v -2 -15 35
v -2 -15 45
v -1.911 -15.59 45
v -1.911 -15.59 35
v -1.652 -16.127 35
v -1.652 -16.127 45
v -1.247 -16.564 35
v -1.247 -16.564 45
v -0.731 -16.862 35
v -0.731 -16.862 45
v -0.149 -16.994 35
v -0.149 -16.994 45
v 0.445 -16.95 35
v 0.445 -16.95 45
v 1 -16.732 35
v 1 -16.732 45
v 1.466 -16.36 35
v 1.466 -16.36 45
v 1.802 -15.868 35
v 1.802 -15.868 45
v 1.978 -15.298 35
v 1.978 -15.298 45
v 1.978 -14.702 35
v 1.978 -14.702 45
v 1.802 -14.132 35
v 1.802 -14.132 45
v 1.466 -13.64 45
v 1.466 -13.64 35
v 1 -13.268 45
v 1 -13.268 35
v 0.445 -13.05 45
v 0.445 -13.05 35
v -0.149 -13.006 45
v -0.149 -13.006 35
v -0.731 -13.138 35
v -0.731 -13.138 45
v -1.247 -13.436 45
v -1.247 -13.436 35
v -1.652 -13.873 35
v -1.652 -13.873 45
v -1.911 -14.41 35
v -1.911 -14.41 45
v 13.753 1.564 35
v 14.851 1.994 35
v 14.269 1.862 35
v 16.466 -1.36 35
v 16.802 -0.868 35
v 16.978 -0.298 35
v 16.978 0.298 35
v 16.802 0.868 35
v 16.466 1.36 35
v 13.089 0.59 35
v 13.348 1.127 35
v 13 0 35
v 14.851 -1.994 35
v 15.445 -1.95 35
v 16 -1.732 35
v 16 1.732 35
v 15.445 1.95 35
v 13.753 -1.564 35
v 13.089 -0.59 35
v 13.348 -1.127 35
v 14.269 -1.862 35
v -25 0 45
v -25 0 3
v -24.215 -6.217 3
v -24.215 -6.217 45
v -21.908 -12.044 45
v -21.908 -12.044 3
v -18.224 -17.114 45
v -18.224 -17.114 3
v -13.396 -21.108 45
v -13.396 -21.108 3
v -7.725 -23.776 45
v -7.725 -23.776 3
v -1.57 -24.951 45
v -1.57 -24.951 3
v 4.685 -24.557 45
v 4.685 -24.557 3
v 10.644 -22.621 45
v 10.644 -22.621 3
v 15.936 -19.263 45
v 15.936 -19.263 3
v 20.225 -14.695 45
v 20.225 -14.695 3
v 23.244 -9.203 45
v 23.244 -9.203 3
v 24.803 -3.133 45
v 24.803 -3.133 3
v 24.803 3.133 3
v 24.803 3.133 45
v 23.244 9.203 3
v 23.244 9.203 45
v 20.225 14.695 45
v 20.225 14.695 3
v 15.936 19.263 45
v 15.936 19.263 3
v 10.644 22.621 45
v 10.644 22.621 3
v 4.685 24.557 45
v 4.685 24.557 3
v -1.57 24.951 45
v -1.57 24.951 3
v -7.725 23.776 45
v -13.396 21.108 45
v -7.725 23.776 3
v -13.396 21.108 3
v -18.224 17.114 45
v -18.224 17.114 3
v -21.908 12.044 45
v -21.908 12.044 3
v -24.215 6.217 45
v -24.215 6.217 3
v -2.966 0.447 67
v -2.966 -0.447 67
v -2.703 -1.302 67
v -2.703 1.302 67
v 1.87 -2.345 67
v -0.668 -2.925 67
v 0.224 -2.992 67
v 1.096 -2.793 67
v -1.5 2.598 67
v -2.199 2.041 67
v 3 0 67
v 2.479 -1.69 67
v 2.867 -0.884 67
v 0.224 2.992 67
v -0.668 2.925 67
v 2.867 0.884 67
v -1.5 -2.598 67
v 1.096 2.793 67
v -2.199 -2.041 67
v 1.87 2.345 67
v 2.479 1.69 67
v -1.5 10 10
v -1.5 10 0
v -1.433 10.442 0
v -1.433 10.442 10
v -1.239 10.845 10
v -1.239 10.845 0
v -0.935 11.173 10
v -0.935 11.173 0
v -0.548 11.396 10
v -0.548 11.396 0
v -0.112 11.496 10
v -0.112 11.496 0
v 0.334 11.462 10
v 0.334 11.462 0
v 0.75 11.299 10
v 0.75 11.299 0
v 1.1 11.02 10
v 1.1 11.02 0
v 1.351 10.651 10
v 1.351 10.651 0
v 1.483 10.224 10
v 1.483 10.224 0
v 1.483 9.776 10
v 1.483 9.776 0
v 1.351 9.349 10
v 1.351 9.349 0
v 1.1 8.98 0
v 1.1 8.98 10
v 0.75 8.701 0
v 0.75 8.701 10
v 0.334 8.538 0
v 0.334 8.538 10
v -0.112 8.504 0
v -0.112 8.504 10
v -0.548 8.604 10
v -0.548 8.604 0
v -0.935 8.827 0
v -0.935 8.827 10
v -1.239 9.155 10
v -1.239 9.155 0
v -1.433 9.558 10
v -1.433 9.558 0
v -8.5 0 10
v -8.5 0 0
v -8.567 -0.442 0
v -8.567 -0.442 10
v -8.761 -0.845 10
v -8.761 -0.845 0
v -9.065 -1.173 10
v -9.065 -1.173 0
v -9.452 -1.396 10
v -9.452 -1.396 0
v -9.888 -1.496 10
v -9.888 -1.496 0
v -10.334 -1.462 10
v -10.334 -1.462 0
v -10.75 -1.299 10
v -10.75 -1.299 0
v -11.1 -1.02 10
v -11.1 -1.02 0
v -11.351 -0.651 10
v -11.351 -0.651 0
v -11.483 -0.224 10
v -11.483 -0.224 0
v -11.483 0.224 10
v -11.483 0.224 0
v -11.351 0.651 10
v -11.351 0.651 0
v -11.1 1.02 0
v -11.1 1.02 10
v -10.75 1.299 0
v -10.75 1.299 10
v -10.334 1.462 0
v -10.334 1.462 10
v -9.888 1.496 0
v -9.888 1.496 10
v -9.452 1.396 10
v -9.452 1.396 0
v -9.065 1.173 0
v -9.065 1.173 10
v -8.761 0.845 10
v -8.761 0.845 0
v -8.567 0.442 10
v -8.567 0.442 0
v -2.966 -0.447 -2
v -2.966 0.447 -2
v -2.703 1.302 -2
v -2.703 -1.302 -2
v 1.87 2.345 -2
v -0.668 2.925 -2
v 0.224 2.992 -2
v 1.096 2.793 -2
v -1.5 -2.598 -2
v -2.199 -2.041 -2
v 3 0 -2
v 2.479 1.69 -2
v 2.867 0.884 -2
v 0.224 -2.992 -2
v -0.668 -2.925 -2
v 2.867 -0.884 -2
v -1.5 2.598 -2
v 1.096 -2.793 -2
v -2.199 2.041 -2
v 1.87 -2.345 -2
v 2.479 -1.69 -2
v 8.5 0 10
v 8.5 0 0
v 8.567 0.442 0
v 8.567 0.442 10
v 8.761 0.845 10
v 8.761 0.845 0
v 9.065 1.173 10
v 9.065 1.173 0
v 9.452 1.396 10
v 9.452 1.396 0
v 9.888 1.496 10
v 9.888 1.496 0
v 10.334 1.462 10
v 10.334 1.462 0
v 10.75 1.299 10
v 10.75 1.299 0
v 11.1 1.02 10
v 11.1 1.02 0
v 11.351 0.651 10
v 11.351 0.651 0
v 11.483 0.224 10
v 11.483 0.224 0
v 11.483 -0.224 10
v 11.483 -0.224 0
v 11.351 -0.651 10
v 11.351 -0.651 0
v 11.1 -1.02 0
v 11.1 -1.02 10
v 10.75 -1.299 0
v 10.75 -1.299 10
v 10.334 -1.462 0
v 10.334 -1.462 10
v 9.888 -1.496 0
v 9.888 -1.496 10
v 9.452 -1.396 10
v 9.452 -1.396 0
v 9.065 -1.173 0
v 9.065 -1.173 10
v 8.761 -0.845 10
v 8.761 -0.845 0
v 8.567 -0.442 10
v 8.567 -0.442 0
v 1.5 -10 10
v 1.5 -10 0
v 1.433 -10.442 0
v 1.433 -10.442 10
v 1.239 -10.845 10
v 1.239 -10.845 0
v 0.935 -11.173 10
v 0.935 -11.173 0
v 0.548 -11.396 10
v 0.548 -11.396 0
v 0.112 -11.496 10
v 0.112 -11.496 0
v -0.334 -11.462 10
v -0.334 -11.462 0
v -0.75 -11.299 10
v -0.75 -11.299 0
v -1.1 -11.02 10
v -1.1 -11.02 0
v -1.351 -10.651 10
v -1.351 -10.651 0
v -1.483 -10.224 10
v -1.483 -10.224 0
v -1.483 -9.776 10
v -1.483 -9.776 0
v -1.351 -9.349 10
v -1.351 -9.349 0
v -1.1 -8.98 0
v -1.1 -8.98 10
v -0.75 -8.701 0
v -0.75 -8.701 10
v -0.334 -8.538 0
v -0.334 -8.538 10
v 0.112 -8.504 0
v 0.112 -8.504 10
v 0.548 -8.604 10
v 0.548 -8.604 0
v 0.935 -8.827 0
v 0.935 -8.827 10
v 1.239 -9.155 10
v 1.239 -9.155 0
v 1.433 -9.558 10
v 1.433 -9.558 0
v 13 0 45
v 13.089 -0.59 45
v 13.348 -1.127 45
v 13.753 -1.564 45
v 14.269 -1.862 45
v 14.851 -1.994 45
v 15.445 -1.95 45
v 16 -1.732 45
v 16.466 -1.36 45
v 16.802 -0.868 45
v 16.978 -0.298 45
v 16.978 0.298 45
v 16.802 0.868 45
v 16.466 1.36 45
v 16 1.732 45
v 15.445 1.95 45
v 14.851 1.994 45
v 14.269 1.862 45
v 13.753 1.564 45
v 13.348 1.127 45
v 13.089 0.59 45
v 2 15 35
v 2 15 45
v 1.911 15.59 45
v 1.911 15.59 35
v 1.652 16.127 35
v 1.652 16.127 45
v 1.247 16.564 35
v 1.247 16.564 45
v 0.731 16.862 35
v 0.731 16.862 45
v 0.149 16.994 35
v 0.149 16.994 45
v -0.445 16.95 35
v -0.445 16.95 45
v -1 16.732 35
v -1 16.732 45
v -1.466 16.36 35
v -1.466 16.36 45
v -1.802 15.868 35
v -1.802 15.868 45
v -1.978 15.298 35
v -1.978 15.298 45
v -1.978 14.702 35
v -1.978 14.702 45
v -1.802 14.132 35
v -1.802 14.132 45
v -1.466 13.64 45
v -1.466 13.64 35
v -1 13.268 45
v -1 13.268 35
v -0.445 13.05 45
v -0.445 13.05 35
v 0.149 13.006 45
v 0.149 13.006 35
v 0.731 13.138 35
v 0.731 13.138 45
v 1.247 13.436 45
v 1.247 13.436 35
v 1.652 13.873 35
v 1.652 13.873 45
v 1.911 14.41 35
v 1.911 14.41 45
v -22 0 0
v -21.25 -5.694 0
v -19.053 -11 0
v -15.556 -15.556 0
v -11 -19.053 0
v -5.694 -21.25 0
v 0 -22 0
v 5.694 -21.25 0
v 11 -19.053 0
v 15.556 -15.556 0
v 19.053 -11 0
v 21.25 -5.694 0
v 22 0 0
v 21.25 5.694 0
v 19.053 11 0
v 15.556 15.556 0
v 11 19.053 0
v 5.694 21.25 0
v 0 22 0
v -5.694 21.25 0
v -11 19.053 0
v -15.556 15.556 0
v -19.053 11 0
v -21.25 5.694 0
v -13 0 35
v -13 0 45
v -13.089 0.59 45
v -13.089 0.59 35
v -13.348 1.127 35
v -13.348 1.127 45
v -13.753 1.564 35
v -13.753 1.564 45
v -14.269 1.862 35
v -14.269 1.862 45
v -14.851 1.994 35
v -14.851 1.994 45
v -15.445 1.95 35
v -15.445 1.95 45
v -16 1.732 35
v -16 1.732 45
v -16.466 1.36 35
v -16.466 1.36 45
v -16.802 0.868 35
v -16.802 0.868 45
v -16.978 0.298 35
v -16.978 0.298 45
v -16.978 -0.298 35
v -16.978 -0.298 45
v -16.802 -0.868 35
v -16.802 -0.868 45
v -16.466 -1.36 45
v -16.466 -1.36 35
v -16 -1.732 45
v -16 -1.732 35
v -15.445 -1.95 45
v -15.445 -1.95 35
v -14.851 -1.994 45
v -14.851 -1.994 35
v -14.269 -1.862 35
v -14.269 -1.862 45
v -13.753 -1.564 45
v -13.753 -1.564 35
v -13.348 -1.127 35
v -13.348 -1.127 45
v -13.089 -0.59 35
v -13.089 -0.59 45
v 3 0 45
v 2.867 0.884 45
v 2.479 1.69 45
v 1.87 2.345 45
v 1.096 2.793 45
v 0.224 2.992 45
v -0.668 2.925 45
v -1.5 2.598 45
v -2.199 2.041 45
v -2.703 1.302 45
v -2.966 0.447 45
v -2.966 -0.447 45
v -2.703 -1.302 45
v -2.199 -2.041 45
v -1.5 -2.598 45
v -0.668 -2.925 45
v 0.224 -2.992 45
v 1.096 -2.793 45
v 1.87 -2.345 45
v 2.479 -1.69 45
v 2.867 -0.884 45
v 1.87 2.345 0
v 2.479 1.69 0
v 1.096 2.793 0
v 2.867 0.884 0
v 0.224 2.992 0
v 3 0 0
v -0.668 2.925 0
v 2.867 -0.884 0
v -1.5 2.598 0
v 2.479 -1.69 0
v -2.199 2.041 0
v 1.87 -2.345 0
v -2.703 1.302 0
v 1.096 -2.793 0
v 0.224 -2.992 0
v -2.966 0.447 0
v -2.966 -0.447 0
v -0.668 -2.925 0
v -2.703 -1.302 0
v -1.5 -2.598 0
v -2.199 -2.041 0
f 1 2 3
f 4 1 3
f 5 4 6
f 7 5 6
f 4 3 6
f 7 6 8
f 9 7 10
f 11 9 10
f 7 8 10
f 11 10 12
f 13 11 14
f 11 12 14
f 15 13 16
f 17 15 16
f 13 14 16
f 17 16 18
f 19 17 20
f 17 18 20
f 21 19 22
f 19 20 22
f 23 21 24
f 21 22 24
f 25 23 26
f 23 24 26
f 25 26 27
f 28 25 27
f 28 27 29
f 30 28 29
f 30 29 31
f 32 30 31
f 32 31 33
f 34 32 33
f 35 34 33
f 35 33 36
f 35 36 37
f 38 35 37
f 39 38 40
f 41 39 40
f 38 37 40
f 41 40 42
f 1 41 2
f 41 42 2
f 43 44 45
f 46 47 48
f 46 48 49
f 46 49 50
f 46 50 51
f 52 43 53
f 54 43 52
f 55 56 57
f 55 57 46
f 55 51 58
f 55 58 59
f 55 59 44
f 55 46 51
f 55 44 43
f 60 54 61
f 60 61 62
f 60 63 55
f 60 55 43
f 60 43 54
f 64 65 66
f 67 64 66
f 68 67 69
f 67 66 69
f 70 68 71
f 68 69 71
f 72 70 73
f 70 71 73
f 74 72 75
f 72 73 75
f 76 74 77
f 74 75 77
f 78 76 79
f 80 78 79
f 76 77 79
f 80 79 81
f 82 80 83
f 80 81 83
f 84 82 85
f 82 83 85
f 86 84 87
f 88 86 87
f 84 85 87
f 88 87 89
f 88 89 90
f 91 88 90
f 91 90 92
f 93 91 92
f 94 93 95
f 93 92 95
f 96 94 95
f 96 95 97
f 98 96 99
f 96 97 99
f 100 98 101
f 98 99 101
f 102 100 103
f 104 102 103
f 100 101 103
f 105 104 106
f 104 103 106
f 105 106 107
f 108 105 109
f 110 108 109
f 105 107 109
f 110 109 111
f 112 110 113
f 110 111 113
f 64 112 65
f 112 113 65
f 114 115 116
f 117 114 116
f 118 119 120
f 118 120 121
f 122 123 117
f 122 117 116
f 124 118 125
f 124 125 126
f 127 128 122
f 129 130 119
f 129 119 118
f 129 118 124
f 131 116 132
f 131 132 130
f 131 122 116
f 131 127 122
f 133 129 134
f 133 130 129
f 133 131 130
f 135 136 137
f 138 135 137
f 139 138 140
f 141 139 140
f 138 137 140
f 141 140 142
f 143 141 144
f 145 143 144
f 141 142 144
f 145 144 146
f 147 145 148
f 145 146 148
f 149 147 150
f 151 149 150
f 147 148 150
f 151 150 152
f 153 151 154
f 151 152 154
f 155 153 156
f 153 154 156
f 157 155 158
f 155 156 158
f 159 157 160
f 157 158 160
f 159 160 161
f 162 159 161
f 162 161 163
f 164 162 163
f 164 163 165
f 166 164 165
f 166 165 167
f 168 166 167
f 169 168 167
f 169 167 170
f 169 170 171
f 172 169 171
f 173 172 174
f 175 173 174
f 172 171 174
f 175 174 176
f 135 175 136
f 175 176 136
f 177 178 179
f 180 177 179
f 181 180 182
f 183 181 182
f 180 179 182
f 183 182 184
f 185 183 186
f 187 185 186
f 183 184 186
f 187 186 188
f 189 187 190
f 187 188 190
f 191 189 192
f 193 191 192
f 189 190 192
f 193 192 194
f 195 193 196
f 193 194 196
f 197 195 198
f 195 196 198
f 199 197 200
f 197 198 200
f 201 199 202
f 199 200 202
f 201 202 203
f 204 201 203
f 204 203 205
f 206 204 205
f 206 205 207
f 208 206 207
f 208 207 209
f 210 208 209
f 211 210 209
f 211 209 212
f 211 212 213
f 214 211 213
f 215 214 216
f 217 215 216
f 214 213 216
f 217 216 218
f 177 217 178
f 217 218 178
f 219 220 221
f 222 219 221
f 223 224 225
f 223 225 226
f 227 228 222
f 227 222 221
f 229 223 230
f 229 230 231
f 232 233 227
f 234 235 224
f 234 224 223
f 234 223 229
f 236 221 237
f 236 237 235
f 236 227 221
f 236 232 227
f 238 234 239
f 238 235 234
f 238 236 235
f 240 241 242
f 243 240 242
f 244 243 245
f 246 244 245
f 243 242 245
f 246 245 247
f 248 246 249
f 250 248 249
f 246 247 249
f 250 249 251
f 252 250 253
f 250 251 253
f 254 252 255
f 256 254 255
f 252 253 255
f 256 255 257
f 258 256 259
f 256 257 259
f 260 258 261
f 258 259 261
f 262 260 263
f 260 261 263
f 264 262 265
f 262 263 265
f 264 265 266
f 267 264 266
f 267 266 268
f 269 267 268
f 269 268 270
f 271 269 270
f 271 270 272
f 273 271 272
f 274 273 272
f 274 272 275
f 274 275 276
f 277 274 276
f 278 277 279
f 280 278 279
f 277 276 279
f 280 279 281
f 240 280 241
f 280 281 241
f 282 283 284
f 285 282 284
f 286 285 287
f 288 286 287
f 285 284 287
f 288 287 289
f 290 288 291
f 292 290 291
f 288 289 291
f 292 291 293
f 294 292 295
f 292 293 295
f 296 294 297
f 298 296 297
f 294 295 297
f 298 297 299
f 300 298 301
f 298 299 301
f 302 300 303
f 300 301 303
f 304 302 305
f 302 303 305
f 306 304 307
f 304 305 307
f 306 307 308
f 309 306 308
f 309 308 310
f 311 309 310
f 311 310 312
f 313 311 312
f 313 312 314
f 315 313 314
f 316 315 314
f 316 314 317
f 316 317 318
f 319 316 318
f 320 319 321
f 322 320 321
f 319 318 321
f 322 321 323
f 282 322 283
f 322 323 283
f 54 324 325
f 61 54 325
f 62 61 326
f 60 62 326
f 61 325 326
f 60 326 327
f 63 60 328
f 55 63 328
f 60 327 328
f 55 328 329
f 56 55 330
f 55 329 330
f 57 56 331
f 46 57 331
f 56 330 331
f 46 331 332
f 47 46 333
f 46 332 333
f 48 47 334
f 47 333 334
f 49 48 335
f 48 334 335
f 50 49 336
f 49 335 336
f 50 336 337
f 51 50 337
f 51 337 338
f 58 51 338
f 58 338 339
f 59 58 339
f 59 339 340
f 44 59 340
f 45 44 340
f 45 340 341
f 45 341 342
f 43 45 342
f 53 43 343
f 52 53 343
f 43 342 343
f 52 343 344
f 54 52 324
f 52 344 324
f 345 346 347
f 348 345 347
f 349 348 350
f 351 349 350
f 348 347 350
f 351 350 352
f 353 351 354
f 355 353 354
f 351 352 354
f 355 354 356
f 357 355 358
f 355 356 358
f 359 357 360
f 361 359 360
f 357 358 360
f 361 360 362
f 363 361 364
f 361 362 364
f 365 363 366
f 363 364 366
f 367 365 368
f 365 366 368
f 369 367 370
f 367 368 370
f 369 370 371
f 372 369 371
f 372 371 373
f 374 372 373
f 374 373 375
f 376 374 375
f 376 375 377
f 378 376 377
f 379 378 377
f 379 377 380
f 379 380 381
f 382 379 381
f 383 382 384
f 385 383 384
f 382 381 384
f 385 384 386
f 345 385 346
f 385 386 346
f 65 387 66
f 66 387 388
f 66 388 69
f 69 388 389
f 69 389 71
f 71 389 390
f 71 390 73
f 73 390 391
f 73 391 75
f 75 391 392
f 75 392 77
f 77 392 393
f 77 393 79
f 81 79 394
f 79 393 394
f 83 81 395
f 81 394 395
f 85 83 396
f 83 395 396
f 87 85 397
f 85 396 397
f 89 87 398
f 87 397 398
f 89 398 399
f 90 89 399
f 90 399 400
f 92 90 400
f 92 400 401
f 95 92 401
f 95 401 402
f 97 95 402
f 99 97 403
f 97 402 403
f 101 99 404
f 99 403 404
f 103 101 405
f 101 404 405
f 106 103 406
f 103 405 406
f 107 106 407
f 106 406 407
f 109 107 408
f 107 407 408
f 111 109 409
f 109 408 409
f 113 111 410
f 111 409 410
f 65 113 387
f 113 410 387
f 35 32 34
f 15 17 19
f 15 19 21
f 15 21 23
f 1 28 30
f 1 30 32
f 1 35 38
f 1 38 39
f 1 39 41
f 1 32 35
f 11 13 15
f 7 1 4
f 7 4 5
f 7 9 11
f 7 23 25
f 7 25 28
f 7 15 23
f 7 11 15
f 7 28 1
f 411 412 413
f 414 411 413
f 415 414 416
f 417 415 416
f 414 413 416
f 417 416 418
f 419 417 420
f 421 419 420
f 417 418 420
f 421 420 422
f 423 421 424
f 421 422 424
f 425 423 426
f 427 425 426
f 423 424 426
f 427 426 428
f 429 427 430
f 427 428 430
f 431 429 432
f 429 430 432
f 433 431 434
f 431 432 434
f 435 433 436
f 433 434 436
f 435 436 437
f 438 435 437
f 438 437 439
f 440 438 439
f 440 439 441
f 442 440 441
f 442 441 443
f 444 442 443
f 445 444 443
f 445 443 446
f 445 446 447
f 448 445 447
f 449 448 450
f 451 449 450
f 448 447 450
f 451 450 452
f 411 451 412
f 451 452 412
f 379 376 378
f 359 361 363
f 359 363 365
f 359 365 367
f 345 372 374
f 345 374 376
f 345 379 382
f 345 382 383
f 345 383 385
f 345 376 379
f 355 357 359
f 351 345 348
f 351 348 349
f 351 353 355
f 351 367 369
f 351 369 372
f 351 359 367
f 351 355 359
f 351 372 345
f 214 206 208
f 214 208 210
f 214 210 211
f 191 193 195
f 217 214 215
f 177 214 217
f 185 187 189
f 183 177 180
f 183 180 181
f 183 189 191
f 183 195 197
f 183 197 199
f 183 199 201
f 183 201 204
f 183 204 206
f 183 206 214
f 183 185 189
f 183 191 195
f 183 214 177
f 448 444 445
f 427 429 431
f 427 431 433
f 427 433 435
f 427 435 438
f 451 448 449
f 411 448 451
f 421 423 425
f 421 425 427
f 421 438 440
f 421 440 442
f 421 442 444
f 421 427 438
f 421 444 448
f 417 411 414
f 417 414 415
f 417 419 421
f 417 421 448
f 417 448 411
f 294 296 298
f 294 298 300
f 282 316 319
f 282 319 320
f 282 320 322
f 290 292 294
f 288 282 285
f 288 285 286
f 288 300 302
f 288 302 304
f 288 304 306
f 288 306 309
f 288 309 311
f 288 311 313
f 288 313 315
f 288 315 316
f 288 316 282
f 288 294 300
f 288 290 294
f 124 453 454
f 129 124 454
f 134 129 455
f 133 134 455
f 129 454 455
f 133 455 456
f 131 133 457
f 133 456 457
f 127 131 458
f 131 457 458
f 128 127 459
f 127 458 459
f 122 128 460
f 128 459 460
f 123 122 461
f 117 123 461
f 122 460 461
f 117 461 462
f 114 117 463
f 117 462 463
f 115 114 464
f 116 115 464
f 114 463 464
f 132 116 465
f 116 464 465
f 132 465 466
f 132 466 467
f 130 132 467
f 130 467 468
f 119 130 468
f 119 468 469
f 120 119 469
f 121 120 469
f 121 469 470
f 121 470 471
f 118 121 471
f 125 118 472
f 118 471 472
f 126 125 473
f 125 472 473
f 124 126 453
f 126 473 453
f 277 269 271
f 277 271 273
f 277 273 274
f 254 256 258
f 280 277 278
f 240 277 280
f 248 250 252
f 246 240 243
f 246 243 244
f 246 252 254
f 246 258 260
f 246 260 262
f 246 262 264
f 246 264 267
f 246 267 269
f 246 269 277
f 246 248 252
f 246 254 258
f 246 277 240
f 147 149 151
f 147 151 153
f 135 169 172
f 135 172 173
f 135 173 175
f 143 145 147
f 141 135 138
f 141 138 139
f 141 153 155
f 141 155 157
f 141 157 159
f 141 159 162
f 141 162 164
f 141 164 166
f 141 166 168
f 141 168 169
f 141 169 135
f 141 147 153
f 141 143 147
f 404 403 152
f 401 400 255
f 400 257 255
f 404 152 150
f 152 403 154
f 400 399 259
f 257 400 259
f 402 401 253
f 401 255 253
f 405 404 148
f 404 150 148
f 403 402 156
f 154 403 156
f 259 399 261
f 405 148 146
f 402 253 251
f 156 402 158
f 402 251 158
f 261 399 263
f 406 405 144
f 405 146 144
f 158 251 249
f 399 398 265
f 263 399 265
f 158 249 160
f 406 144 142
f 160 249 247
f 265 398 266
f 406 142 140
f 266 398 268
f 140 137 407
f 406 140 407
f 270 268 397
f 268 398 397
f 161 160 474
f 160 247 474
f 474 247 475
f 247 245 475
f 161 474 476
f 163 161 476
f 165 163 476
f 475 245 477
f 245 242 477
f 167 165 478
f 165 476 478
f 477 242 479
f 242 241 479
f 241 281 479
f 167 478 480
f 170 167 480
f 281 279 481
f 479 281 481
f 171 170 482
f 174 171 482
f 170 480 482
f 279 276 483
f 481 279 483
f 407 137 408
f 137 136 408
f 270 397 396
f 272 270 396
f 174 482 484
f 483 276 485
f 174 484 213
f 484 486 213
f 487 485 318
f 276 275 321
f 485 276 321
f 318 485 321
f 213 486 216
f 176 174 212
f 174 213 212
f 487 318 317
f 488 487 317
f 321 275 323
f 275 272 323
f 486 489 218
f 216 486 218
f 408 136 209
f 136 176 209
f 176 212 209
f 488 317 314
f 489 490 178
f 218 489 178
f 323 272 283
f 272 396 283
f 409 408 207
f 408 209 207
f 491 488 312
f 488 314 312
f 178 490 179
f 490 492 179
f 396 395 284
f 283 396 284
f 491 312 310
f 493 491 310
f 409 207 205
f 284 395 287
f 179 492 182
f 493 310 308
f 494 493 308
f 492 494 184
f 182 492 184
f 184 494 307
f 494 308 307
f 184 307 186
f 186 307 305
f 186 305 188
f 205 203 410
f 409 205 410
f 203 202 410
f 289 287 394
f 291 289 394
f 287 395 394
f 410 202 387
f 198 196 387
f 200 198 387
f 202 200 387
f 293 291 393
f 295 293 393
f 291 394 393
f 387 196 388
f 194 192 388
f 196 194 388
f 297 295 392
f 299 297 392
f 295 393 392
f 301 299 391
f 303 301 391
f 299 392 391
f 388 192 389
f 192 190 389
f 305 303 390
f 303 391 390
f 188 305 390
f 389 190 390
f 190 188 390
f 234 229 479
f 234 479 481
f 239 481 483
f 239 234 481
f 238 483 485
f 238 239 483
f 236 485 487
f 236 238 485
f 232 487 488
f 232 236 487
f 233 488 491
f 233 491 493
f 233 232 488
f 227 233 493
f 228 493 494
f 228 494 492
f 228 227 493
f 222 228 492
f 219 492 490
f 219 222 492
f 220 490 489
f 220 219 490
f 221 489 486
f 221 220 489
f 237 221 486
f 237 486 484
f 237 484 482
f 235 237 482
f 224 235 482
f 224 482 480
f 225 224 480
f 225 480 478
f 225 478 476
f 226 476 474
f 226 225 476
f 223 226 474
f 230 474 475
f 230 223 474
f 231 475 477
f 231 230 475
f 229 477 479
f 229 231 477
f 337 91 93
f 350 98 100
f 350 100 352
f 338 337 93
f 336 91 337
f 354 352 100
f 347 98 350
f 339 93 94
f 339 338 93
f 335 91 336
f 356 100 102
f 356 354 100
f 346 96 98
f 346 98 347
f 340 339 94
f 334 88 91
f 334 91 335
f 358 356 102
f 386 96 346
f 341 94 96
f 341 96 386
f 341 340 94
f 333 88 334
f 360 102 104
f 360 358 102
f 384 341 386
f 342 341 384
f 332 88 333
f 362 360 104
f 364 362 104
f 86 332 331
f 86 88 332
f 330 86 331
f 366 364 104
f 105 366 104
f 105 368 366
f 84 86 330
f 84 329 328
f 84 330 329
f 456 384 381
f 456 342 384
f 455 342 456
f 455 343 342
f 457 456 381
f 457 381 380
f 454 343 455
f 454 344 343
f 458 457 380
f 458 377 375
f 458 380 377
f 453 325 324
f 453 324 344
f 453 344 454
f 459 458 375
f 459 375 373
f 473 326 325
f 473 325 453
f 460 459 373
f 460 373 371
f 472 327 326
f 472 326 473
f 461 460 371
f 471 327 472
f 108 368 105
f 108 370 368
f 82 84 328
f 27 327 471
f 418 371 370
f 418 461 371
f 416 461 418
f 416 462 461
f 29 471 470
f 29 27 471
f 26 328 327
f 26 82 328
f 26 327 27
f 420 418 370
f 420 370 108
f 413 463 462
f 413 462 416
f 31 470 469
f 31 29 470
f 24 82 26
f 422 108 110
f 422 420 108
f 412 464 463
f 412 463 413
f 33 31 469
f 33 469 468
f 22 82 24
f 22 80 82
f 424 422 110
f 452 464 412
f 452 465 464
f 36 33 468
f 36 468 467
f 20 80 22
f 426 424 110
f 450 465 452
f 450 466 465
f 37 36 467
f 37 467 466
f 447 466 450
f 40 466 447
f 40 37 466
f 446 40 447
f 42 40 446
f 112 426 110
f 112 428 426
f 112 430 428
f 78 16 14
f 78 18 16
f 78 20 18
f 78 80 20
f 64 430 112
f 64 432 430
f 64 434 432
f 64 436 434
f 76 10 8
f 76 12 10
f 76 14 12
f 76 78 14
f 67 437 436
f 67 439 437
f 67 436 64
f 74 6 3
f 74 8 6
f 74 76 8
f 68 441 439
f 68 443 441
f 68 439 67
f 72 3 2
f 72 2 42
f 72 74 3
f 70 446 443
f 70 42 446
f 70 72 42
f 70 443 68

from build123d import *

# Parameters (mm, degrees)
SKETCH1_R           = 25
BOSS_EXTRUDE1_DEPTH = 45
SKETCH2_R           = 2
CUT_EXTRUDE1_DEPTH  = 10
SKETCH3_R           = 3
BOSS_EXTRUDE2_DEPTH = 22
SKETCH4_R           = 1.5
CUT_EXTRUDE2_DEPTH  = 10
BOSS_EXTRUDE3_START = 2
SKETCH5_R           = 3
BOSS_EXTRUDE3_DEPTH = 2
CHAMFER1_SIZE       = 3


with BuildPart() as part:
    # Sketch1 → Boss-Extrude1 (new body)
    with BuildSketch(Plane.XY):
        with Locations(Location((0, 0, 0), (0, 0, 180))):
            Circle(SKETCH1_R)
    extrude(amount=BOSS_EXTRUDE1_DEPTH)

    # Sketch2 → Cut-Extrude1 (cut)
    with BuildSketch(Plane.XY.offset(45)):
        with Locations((0, 15)):
            Circle(SKETCH2_R)
        with Locations(Location((0, -15, 0), (0, 0, 180))):
            Circle(SKETCH2_R)
        with Locations((-15, 0)):
            Circle(SKETCH2_R)
        with Locations(Location((15, 0, 0), (0, 0, 180))):
            Circle(SKETCH2_R)
    extrude(amount=-CUT_EXTRUDE1_DEPTH, mode=Mode.SUBTRACT)

    # Sketch3 → Boss-Extrude2 (add)
    with BuildSketch(Plane.XY.offset(45)):
        Circle(SKETCH3_R)
    extrude(amount=BOSS_EXTRUDE2_DEPTH)

    # Sketch4 → Cut-Extrude2 (cut)
    with BuildSketch(Plane(origin=(0, 0, 0), x_dir=(-1, 0, 0), z_dir=(0, 0, -1))):
        with Locations((0, 10)):
            Circle(SKETCH4_R)
        with Locations(Location((0, -10, 0), (0, 0, 180))):
            Circle(SKETCH4_R)
        with Locations((-10, 0)):
            Circle(SKETCH4_R)
        with Locations(Location((10, 0, 0), (0, 0, 180))):
            Circle(SKETCH4_R)
    extrude(amount=-CUT_EXTRUDE2_DEPTH, mode=Mode.SUBTRACT)

    # Sketch5 → Boss-Extrude3 (add)
    with BuildSketch(Plane(origin=(0, 0, 0), x_dir=(-1, 0, 0), z_dir=(0, 0, -1)).offset(BOSS_EXTRUDE3_START)):
        with Locations(Location((0, 0, 0), (0, 0, 180))):
            Circle(SKETCH5_R)
    extrude(amount=-BOSS_EXTRUDE3_DEPTH)

    # Chamfer1
    chamfer1_edges = [part.edges().sort_by_distance(p)[0] for p in [
        (25, 0, 0),
    ]]
    chamfer(chamfer1_edges, length=CHAMFER1_SIZE)


solid = part.part
